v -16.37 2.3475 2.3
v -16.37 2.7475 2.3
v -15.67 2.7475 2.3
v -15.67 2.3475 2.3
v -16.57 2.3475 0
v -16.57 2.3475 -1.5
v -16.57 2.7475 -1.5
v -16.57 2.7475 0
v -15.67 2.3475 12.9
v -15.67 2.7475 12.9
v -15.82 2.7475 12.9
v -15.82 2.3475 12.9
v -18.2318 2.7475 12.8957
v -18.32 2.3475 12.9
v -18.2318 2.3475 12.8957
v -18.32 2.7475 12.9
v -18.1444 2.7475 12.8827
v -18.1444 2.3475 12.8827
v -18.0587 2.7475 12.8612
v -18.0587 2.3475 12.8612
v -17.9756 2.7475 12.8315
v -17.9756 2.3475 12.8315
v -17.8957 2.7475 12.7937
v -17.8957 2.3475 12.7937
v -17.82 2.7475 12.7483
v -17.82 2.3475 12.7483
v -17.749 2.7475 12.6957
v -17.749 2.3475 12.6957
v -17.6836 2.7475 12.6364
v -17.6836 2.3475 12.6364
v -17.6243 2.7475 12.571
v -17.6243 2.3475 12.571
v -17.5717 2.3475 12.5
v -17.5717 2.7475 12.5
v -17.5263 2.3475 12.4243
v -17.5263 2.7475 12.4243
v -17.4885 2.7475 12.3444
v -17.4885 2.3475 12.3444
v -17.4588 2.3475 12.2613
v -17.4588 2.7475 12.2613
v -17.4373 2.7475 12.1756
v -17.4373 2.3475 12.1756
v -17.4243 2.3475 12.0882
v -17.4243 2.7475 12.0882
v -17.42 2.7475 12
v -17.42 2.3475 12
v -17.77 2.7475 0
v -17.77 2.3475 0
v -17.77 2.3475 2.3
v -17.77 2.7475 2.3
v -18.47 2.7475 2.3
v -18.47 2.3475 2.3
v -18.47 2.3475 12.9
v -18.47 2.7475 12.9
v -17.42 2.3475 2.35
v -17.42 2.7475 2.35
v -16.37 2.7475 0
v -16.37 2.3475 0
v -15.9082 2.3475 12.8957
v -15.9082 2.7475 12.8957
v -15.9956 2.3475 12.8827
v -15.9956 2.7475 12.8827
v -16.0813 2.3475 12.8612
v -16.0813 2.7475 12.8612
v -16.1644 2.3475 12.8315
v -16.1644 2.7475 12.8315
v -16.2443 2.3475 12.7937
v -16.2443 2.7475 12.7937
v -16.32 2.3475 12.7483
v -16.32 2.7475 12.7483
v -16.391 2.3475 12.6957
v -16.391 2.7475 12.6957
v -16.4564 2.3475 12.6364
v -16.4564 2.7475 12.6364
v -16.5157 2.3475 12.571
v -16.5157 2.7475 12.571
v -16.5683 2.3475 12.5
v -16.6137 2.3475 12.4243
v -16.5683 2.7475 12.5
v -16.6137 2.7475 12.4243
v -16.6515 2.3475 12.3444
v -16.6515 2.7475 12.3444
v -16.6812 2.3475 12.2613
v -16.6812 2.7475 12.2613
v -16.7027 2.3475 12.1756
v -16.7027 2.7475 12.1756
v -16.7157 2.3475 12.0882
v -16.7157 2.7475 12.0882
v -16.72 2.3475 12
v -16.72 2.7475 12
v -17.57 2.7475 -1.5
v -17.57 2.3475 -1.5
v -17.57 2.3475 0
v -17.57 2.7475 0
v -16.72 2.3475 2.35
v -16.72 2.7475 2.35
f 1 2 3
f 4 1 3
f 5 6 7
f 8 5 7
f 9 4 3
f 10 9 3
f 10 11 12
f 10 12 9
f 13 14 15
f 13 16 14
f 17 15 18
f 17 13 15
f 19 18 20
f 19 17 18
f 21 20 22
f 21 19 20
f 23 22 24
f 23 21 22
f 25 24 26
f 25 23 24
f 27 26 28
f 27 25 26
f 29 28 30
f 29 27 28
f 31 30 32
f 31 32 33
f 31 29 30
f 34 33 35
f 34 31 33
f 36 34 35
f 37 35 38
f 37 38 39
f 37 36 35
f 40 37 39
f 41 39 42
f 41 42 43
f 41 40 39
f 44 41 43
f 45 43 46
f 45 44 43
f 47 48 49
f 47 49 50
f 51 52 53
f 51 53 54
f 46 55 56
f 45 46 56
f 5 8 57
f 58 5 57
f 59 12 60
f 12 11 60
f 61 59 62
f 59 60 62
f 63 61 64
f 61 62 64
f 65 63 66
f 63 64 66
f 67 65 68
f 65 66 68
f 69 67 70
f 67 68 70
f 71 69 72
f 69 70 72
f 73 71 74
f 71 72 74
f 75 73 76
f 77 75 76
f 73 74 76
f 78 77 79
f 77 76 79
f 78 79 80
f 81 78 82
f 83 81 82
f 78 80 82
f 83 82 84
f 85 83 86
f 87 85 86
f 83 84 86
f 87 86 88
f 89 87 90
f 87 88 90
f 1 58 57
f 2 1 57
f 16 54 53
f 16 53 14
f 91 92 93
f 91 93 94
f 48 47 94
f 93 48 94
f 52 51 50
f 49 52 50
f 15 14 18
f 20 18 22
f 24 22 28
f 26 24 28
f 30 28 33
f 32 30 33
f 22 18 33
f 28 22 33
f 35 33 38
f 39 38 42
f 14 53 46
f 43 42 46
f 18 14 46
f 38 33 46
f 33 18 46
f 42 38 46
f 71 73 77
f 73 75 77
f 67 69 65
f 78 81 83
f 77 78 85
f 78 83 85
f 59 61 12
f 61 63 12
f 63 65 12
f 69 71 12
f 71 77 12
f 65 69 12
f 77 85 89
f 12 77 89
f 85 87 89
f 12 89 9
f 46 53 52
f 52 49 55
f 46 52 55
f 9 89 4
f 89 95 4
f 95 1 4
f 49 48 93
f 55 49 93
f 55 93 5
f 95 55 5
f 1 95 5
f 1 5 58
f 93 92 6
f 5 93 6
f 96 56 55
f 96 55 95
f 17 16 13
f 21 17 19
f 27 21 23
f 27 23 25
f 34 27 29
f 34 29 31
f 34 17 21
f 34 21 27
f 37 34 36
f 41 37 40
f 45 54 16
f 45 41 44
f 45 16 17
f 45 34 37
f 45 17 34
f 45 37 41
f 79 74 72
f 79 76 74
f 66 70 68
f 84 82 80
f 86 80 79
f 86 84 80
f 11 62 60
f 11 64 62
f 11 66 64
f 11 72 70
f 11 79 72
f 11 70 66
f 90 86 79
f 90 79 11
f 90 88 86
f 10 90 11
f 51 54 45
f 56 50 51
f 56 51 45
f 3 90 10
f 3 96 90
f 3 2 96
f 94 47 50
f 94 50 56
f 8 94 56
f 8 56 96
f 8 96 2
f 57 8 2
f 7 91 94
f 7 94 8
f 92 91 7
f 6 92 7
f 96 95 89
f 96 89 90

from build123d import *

# Parameters (mm, degrees)
BOX017_W     = 2.8
BOX017_H     = 0.4
BOX017_DEPTH = 14.4
BOX018_W     = 0.7
BOX018_H     = 0.4
BOX018_DEPTH = 10.55
BOX019_W     = 0.7
BOX019_H     = 0.4
BOX019_DEPTH = 3.8
BOX020_W     = 0.7
BOX020_H     = 0.4
BOX020_DEPTH = 3.8
BOX021_W     = 0.2
BOX021_H     = 0.4
BOX021_DEPTH = 1.5
BOX022_W     = 0.2
BOX022_H     = 0.4
BOX022_DEPTH = 1.5
FILLET003_R  = 0.9


with BuildPart() as part:
    # Box017 → Box017 (join)
    with BuildSketch(Plane(origin=(-20.85, -2.74, -1.5), x_dir=(1, 0, 0), z_dir=(0, 0, 1))):
        with Locations((1.4, 0.2)):
            Rectangle(BOX017_W, BOX017_H)
    extrude(amount=BOX017_DEPTH)

    # Box018 → Box018 (cut)
    with BuildSketch(Plane(origin=(-19.8, -2.74, 2.35), x_dir=(1, 0, 0), z_dir=(0, 0, 1))):
        with Locations((0.35, 0.2)):
            Rectangle(BOX018_W, BOX018_H)
    extrude(amount=BOX018_DEPTH, mode=Mode.SUBTRACT)

    # Box019 → Box019 (cut)
    with BuildSketch(Plane(origin=(-20.85, -2.74, -1.5), x_dir=(1, 0, 0), z_dir=(0, 0, 1))):
        with Locations((0.35, 0.2)):
            Rectangle(BOX019_W, BOX019_H)
    extrude(amount=BOX019_DEPTH, mode=Mode.SUBTRACT)

    # Box020 → Box020 (cut)
    with BuildSketch(Plane(origin=(-18.75, -2.74, -1.5), x_dir=(1, 0, 0), z_dir=(0, 0, 1))):
        with Locations((0.35, 0.2)):
            Rectangle(BOX020_W, BOX020_H)
    extrude(amount=BOX020_DEPTH, mode=Mode.SUBTRACT)

    # Box021 → Box021 (cut)
    with BuildSketch(Plane(origin=(-20.15, -2.74, -1.5), x_dir=(1, 0, 0), z_dir=(0, 0, 1))):
        with Locations((0.1, 0.2)):
            Rectangle(BOX021_W, BOX021_H)
    extrude(amount=BOX021_DEPTH, mode=Mode.SUBTRACT)

    # Box022 → Box022 (cut)
    with BuildSketch(Plane(origin=(-18.95, -2.74, -1.5), x_dir=(1, 0, 0), z_dir=(0, 0, 1))):
        with Locations((0.1, 0.2)):
            Rectangle(BOX022_W, BOX022_H)
    extrude(amount=BOX022_DEPTH, mode=Mode.SUBTRACT)

    # Fillet003
    fillet003_edges = [part.edges().sort_by_distance(p)[0] for p in [
        (-19.8, -2.54, 12.9),
        (-19.1, -2.54, 12.9),
    ]]
    fillet(fillet003_edges, radius=FILLET003_R)


with BuildPart() as part_1:
    # Body003 placement: moved
    add(part.part.moved(Location((2.38, 5.0875, 0))))


solid = part_1.part
